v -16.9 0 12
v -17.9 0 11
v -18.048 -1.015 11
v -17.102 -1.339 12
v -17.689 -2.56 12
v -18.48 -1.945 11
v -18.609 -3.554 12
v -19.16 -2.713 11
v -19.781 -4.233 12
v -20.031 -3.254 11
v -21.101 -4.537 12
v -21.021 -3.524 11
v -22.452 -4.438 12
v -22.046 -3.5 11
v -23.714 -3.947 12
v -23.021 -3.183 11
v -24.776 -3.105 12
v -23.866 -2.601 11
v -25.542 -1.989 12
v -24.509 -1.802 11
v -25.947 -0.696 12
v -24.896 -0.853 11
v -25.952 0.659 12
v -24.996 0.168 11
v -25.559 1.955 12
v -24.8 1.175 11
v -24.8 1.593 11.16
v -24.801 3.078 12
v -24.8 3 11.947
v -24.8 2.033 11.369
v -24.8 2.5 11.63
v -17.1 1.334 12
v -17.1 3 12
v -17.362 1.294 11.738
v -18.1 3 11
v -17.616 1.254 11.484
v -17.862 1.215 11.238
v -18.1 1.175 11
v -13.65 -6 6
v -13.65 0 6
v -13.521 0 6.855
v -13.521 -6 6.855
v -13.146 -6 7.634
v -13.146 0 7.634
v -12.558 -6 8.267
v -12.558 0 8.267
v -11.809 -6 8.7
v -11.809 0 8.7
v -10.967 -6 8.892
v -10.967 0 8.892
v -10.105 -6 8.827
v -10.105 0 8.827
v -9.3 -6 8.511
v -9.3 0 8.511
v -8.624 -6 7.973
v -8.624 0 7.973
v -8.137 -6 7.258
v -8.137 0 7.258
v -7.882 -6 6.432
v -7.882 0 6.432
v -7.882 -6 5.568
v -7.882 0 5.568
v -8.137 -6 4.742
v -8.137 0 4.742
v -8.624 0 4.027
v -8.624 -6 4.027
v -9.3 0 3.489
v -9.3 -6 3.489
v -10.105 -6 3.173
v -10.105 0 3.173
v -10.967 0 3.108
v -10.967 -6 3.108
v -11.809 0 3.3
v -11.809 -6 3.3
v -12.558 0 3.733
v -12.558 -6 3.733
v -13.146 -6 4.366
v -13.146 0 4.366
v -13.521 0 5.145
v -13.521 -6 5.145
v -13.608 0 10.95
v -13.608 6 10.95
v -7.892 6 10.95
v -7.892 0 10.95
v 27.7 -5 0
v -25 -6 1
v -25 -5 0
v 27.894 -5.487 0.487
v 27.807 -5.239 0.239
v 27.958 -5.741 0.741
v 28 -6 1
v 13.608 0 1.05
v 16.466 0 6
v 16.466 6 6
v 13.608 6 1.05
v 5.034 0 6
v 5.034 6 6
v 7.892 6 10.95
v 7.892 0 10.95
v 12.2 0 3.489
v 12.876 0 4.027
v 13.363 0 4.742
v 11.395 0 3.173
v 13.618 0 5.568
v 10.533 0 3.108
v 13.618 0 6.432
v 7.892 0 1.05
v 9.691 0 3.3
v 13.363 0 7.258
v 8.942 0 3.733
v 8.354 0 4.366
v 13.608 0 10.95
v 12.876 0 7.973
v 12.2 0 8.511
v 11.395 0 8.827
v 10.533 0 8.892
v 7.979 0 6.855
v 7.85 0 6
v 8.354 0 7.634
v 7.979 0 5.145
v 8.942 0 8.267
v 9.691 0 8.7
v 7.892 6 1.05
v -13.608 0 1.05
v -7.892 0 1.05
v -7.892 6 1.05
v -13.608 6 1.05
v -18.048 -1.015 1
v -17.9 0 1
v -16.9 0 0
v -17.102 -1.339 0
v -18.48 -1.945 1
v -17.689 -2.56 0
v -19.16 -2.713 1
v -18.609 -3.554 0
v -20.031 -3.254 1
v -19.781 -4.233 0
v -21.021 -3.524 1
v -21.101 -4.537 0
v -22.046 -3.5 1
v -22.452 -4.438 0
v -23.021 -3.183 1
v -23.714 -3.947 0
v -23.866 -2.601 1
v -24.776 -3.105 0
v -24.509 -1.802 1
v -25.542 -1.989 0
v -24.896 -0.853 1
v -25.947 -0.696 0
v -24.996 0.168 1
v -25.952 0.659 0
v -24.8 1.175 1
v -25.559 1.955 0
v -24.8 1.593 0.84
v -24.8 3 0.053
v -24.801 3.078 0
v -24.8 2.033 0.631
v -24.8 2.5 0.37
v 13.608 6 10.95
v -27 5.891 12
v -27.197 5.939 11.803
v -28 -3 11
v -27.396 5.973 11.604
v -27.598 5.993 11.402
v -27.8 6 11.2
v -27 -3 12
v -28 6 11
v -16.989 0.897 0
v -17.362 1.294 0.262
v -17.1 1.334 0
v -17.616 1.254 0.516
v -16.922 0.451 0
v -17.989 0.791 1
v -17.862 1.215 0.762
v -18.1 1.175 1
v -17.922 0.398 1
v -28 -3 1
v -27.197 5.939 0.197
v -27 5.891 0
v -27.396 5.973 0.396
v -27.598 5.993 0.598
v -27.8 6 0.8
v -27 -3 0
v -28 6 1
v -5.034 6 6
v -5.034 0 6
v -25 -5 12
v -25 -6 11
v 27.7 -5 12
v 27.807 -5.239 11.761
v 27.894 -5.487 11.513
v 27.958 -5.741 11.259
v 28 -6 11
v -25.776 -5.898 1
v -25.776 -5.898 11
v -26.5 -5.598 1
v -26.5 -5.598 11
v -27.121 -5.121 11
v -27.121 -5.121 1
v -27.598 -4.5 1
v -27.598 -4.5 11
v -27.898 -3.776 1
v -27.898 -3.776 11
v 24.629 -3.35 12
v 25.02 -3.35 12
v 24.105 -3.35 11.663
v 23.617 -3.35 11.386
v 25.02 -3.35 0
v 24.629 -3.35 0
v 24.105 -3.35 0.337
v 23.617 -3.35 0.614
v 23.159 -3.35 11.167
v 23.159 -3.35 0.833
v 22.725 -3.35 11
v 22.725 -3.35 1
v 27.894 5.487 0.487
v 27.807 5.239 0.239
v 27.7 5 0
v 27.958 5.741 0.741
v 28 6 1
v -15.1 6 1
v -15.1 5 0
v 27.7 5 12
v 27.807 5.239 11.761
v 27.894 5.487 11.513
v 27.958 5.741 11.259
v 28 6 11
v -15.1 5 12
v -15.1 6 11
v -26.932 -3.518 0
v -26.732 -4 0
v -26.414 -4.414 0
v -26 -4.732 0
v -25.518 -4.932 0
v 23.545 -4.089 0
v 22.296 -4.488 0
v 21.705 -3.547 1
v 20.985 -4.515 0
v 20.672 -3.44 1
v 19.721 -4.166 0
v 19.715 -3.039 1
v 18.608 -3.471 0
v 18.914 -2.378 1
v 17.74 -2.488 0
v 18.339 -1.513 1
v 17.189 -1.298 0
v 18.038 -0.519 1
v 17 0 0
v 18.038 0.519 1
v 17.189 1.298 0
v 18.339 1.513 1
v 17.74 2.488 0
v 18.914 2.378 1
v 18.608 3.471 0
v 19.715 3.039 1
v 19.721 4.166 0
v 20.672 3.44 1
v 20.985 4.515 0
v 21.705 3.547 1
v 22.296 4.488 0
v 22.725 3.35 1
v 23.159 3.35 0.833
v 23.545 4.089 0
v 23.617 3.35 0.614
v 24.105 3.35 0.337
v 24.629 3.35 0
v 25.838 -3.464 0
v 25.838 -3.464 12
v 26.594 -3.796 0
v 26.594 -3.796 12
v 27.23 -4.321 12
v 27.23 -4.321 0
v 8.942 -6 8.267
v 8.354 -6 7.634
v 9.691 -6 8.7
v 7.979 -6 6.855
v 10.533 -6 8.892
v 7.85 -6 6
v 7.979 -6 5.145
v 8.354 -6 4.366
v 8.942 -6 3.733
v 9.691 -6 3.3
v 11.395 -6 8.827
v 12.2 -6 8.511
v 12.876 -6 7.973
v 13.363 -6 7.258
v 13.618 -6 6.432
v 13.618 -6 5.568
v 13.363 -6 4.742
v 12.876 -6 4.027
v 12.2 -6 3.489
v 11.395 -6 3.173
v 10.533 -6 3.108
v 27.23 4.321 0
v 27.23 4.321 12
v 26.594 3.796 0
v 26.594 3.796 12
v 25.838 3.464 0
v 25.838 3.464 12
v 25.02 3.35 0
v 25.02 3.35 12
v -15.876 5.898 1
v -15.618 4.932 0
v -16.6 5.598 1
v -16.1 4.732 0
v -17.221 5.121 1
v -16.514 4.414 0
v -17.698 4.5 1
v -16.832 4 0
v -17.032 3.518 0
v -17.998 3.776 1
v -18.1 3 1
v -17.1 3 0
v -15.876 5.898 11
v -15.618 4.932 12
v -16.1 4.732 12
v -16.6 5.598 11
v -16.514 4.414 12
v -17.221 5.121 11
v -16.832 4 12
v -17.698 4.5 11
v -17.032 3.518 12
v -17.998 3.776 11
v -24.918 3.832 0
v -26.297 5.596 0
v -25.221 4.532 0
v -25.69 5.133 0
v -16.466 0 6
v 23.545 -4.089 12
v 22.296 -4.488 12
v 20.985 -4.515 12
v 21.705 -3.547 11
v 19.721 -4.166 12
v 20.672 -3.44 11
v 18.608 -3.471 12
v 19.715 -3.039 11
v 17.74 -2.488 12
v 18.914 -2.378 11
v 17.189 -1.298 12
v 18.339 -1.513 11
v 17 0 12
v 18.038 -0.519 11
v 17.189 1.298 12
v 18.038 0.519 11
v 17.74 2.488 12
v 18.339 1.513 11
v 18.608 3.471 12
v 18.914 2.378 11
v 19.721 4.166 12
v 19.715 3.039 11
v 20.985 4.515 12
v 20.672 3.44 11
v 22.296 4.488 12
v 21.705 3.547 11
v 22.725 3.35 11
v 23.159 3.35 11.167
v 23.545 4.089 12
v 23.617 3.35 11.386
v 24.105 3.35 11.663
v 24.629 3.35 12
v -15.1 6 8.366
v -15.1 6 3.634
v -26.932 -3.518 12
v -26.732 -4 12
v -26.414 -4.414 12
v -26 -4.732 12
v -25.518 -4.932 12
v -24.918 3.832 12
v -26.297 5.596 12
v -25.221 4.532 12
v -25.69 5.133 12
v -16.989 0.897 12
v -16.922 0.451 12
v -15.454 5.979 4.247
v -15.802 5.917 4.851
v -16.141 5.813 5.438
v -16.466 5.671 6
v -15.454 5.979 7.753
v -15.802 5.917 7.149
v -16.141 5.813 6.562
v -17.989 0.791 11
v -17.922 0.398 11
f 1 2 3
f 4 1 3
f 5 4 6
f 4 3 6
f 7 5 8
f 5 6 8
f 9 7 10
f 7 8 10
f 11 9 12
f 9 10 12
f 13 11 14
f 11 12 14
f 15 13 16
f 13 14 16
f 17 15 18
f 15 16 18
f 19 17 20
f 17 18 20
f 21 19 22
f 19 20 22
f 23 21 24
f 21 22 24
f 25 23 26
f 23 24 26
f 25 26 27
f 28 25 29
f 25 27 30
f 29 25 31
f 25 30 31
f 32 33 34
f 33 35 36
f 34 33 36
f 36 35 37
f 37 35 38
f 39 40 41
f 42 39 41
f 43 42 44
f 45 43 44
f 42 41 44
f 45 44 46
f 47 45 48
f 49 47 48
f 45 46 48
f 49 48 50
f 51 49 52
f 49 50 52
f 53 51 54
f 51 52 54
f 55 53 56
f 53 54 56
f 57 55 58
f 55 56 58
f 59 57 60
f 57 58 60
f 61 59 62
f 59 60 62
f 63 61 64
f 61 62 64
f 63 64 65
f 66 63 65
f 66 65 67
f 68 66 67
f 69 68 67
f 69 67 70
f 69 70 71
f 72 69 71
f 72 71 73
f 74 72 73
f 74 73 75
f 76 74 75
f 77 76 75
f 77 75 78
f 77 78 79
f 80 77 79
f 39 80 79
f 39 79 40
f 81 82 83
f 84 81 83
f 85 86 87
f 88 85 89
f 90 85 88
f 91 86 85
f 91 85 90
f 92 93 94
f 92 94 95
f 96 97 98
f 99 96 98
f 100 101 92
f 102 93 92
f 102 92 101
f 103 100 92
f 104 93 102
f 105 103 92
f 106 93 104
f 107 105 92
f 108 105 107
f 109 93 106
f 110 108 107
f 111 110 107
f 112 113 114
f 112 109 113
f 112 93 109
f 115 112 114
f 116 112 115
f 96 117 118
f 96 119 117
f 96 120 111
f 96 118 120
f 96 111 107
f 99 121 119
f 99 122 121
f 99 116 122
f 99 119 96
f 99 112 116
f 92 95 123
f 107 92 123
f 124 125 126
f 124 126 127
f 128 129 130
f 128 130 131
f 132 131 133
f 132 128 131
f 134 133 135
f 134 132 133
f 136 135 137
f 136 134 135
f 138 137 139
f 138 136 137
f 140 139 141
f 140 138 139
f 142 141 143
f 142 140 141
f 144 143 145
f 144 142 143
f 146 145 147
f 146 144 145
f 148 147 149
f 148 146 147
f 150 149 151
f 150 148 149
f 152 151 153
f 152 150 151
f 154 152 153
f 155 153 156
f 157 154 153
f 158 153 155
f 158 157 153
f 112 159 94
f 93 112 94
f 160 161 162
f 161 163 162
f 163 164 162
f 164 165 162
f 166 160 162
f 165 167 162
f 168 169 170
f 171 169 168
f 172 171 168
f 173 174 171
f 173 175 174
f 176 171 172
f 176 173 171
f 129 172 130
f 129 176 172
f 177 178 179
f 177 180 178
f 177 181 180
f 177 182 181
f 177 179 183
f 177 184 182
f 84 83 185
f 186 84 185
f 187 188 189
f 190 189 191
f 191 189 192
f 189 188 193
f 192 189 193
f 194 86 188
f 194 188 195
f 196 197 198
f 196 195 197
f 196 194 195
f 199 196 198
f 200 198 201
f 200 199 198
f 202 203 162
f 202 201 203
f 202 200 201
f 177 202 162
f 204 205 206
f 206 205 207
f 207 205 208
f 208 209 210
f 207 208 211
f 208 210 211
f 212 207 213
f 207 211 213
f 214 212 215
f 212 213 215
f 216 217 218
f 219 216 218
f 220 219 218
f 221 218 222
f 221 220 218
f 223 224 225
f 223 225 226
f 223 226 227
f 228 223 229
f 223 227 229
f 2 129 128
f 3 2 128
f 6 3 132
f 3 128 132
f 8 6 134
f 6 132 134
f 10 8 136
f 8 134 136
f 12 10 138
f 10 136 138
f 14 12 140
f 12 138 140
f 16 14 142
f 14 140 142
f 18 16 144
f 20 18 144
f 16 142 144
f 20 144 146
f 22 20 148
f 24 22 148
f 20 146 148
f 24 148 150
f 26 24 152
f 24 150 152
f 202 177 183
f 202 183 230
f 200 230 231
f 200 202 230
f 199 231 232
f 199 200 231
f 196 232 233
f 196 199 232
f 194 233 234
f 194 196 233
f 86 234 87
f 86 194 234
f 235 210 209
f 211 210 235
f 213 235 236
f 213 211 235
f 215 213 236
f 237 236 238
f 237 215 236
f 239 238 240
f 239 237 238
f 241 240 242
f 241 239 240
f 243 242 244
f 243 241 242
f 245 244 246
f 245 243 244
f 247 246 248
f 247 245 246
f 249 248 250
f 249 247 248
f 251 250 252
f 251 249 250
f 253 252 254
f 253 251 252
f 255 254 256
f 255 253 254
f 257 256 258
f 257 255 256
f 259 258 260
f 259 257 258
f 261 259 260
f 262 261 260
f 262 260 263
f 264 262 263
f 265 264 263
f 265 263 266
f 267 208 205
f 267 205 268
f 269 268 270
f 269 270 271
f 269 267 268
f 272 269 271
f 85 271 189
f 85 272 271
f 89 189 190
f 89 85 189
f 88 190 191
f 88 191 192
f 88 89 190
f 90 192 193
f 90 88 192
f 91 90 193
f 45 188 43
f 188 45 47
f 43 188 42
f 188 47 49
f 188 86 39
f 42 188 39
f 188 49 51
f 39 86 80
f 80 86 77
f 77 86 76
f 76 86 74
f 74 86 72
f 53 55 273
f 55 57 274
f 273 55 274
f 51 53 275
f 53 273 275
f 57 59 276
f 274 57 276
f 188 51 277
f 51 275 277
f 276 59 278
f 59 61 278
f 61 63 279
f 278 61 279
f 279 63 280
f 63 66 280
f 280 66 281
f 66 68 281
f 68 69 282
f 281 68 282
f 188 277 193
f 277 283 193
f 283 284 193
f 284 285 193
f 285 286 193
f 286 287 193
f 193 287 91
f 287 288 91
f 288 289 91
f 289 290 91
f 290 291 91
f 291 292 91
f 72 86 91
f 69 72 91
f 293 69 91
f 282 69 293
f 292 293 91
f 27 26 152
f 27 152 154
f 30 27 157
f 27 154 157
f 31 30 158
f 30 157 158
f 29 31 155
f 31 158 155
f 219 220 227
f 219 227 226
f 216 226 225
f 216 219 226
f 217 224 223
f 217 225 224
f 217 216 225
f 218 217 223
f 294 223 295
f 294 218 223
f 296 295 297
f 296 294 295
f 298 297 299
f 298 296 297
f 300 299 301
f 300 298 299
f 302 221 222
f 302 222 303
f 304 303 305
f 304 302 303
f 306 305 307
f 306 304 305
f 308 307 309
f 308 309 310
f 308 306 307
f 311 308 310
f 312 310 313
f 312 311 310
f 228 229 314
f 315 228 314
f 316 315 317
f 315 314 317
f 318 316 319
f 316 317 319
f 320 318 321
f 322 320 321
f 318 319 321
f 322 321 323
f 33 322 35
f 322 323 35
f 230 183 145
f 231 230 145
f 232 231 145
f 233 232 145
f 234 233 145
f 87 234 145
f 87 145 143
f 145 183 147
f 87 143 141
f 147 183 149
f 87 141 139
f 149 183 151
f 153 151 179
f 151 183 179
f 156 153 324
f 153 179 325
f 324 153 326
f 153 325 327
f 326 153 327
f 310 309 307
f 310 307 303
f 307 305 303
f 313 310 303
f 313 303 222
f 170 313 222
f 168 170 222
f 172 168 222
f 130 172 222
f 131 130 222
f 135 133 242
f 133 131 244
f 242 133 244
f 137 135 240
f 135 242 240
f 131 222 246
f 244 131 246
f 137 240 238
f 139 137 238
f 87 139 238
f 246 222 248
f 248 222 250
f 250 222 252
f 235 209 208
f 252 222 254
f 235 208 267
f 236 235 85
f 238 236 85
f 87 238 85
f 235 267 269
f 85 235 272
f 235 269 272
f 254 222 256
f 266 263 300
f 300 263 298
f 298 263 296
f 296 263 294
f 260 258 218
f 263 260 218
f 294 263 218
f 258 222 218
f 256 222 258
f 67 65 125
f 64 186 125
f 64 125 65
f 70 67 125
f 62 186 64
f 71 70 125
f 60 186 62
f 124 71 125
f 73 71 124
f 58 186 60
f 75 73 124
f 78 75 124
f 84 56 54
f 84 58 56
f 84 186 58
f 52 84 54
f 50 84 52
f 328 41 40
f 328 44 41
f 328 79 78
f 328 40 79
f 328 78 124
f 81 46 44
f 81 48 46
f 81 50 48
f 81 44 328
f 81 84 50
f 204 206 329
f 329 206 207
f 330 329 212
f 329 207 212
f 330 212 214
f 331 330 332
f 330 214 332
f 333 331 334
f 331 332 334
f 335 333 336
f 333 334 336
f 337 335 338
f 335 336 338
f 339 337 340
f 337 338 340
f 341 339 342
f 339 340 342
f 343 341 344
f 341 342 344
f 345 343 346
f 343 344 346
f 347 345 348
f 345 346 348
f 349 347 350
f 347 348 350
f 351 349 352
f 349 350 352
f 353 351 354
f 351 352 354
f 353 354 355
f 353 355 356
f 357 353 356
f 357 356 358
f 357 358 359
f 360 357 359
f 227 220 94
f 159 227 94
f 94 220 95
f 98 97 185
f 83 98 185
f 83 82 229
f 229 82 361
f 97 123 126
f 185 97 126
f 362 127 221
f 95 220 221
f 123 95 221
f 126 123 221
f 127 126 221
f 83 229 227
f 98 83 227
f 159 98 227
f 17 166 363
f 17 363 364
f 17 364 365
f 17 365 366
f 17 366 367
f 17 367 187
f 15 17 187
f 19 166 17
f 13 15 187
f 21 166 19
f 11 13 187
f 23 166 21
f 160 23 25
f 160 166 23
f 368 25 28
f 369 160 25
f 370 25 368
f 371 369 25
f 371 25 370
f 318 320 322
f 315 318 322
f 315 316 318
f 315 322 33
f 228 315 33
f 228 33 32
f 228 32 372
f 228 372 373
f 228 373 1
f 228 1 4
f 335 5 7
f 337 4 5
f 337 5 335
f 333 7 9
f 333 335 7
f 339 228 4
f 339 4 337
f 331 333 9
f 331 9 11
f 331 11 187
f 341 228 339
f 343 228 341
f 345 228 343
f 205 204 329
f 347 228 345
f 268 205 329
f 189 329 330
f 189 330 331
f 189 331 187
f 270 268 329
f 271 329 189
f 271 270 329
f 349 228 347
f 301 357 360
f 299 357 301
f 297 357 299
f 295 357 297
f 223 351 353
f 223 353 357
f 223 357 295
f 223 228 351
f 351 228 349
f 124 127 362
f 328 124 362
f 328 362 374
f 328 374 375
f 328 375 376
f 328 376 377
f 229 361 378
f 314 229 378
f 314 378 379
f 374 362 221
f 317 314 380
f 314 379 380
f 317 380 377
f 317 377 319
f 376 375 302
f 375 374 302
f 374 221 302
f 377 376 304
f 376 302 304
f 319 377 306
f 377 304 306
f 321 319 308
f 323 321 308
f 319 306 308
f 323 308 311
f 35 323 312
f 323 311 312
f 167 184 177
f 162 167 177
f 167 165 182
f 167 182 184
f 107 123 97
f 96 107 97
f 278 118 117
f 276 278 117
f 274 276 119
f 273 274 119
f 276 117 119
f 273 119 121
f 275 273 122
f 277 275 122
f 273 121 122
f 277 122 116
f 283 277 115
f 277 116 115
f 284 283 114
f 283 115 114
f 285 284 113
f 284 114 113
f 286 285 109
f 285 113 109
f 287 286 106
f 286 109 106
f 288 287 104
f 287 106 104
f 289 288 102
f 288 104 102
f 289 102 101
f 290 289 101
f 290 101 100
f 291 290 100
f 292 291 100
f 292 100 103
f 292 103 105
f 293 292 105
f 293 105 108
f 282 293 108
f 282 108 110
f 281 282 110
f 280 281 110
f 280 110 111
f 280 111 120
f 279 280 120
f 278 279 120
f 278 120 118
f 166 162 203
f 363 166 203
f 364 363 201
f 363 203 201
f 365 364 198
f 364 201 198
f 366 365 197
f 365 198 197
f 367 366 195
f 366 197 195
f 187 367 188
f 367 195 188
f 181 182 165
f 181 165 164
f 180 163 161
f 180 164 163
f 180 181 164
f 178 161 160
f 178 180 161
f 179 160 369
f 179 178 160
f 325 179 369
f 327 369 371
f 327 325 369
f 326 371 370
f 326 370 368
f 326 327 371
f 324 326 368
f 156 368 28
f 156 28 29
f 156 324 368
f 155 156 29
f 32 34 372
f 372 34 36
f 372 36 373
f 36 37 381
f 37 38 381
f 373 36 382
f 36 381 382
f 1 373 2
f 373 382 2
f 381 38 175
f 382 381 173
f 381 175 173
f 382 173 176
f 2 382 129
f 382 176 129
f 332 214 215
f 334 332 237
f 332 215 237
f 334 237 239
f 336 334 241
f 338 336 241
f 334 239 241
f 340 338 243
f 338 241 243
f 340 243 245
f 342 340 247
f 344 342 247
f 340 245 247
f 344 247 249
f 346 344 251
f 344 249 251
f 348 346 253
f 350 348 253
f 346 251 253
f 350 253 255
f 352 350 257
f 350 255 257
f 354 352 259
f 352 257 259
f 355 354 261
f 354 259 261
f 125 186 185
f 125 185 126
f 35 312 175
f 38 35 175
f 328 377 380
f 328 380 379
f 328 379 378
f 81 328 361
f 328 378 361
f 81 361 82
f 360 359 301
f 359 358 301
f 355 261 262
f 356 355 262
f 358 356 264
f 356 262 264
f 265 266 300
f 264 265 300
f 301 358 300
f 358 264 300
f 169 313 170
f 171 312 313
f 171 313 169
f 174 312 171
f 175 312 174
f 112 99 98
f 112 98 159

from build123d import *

# Parameters (mm, degrees)
F1_DEPTH    = 12
F3_T1_DEPTH = 27
F3_T3_DEPTH = 26.8975669154
F4_SIZE     = 1
F2_R        = 2.9
F5_DEPTH    = 12.001
F6_DEPTH    = 6


# Not quite as in the source:
# - a fillet or chamfer that OpenCascade refuses, or shapes differently, is made with other operations: its cross-section is extruded or revolved along the edge and cut away or added


with BuildPart() as f1:
    # F0 (on Top) → F1 (new body)
    with BuildSketch(Plane.XY):
        with BuildLine():
            Line((-24.8, 6), (-28, 6))
            Line((-28, 6), (-28, -6))
            Line((-28, -6), (28, -6))
            Line((28, -6), (28, -3.35))
            Line((28, -3.35), (22.7247340124, -3.35))
            ThreePointArc((22.7247340124, -3.35), (18, 0), (22.7247340124, 3.35))
            Line((22.7247340124, 3.35), (28, 3.35))
            Line((28, 3.35), (28, 6))
            Line((28, 6), (-18.1, 6))
            Line((-18.1, 6), (-18.1, 1.1747340124))
            ThreePointArc((-18.1, 1.1747340124), (-17.9503571611, 0.5958187644), (-17.9, 0))
            ThreePointArc((-17.9, 0), (-22.0458187644, -3.4996428389), (-24.8, 1.1747340124))
            Line((-24.8, 1.1747340124), (-24.8, 6))
        make_face()
    extrude(amount=F1_DEPTH)

    # F3: fillet of radius 3 on 5 edges, made by hand

    # F3_s2 → F3_t1 (cut)
    with BuildSketch(Plane.XY.offset(-7.5)):
        with BuildLine():
            ThreePointArc((-15.1, 6), (-17.2213203436, 5.1213203436), (-18.1, 3))
            Line((-18.1, 3), (-18.1, 6))
            Line((-18.1, 6), (-15.1, 6))
        make_face()
        with BuildLine():
            ThreePointArc((-27.8, 6), (-25.6786796564, 5.1213203436), (-24.8, 3))
            Line((-24.8, 3), (-24.8, 6))
            Line((-24.8, 6), (-27.8, 6))
        make_face()
        with BuildLine():
            ThreePointArc((-25, -6), (-27.1213203436, -5.1213203436), (-28, -3))
            Line((-28, -3), (-28, -6))
            Line((-28, -6), (-25, -6))
        make_face()
    extrude(amount=F3_T1_DEPTH, mode=Mode.SUBTRACT)

    # F3_s4 → F3_t3 (cut)
    with BuildSketch(Plane.XY.offset(-7.4487834577)):
        with BuildLine():
            ThreePointArc((25.0204866169, -3.35), (27.0142268206, -4.1083488229), (28, -6))
            Line((28, -6), (28, -3.35))
            Line((28, -3.35), (25.0204866169, -3.35))
        make_face()
        with BuildLine():
            ThreePointArc((28, 6), (27.0142268206, 4.1083488229), (25.0204866169, 3.35))
            Line((25.0204866169, 3.35), (28, 3.35))
            Line((28, 3.35), (28, 6))
        make_face()
    extrude(amount=F3_T3_DEPTH, mode=Mode.SUBTRACT)

    # F4
    f4_edges = [f1.edges().sort_by_distance(p)[0] for p in [
        (1.5, -6, 12),
        (1.5, -6, 0),
        (18, 0, 12),
        (-21.45, -3.55, 12),
        (18, 0, 0),
        (-21.45, -3.55, 0),
        (6.45, 6, 0),
        (6.45, 6, 12),
        (-18.1, 2.087367, 0),
        (-17.22132, 5.12132, 0),
        (-27.12132, -5.12132, 0),
        (-28, 1.5, 0),
        (-18.1, 2.087367, 12),
        (-17.22132, 5.12132, 12),
        (-27.12132, -5.12132, 12),
        (-28, 1.5, 12),
    ]]
    chamfer(f4_edges, length=F4_SIZE)

    # F2 (on face) → F5 (cut, through all)
    with BuildSketch(Plane(origin=(0, 6, 0), x_dir=(-1, 0, 0), z_dir=(0, 1, 0))):
        with Locations((-10.75, 6)):
            Circle(F2_R)
        with Locations((10.75, 6)):
            Circle(F2_R)
    extrude(amount=-F5_DEPTH, mode=Mode.SUBTRACT)

    # F2 (on face) → F6 (cut)
    with BuildSketch(Plane(origin=(0, 6, 0), x_dir=(-1, 0, 0), z_dir=(0, 1, 0))):
        Polygon((-7.8921161675, 10.95), (-13.6078838325, 10.95), (-16.465767665, 6), (-13.6078838325, 1.05), (-7.8921161675, 1.05), (-5.034232335, 6), align=None)
        with Locations((-10.75, 6)):
            Circle(F2_R, mode=Mode.SUBTRACT)
        Polygon((13.6078838325, 10.95), (7.8921161675, 10.95), (5.034232335, 6), (7.8921161675, 1.05), (13.6078838325, 1.05), (16.465767665, 6), align=None)
        with Locations((10.75, 6)):
            Circle(F2_R, mode=Mode.SUBTRACT)
    extrude(amount=-F6_DEPTH, mode=Mode.SUBTRACT)


solid = f1.part
